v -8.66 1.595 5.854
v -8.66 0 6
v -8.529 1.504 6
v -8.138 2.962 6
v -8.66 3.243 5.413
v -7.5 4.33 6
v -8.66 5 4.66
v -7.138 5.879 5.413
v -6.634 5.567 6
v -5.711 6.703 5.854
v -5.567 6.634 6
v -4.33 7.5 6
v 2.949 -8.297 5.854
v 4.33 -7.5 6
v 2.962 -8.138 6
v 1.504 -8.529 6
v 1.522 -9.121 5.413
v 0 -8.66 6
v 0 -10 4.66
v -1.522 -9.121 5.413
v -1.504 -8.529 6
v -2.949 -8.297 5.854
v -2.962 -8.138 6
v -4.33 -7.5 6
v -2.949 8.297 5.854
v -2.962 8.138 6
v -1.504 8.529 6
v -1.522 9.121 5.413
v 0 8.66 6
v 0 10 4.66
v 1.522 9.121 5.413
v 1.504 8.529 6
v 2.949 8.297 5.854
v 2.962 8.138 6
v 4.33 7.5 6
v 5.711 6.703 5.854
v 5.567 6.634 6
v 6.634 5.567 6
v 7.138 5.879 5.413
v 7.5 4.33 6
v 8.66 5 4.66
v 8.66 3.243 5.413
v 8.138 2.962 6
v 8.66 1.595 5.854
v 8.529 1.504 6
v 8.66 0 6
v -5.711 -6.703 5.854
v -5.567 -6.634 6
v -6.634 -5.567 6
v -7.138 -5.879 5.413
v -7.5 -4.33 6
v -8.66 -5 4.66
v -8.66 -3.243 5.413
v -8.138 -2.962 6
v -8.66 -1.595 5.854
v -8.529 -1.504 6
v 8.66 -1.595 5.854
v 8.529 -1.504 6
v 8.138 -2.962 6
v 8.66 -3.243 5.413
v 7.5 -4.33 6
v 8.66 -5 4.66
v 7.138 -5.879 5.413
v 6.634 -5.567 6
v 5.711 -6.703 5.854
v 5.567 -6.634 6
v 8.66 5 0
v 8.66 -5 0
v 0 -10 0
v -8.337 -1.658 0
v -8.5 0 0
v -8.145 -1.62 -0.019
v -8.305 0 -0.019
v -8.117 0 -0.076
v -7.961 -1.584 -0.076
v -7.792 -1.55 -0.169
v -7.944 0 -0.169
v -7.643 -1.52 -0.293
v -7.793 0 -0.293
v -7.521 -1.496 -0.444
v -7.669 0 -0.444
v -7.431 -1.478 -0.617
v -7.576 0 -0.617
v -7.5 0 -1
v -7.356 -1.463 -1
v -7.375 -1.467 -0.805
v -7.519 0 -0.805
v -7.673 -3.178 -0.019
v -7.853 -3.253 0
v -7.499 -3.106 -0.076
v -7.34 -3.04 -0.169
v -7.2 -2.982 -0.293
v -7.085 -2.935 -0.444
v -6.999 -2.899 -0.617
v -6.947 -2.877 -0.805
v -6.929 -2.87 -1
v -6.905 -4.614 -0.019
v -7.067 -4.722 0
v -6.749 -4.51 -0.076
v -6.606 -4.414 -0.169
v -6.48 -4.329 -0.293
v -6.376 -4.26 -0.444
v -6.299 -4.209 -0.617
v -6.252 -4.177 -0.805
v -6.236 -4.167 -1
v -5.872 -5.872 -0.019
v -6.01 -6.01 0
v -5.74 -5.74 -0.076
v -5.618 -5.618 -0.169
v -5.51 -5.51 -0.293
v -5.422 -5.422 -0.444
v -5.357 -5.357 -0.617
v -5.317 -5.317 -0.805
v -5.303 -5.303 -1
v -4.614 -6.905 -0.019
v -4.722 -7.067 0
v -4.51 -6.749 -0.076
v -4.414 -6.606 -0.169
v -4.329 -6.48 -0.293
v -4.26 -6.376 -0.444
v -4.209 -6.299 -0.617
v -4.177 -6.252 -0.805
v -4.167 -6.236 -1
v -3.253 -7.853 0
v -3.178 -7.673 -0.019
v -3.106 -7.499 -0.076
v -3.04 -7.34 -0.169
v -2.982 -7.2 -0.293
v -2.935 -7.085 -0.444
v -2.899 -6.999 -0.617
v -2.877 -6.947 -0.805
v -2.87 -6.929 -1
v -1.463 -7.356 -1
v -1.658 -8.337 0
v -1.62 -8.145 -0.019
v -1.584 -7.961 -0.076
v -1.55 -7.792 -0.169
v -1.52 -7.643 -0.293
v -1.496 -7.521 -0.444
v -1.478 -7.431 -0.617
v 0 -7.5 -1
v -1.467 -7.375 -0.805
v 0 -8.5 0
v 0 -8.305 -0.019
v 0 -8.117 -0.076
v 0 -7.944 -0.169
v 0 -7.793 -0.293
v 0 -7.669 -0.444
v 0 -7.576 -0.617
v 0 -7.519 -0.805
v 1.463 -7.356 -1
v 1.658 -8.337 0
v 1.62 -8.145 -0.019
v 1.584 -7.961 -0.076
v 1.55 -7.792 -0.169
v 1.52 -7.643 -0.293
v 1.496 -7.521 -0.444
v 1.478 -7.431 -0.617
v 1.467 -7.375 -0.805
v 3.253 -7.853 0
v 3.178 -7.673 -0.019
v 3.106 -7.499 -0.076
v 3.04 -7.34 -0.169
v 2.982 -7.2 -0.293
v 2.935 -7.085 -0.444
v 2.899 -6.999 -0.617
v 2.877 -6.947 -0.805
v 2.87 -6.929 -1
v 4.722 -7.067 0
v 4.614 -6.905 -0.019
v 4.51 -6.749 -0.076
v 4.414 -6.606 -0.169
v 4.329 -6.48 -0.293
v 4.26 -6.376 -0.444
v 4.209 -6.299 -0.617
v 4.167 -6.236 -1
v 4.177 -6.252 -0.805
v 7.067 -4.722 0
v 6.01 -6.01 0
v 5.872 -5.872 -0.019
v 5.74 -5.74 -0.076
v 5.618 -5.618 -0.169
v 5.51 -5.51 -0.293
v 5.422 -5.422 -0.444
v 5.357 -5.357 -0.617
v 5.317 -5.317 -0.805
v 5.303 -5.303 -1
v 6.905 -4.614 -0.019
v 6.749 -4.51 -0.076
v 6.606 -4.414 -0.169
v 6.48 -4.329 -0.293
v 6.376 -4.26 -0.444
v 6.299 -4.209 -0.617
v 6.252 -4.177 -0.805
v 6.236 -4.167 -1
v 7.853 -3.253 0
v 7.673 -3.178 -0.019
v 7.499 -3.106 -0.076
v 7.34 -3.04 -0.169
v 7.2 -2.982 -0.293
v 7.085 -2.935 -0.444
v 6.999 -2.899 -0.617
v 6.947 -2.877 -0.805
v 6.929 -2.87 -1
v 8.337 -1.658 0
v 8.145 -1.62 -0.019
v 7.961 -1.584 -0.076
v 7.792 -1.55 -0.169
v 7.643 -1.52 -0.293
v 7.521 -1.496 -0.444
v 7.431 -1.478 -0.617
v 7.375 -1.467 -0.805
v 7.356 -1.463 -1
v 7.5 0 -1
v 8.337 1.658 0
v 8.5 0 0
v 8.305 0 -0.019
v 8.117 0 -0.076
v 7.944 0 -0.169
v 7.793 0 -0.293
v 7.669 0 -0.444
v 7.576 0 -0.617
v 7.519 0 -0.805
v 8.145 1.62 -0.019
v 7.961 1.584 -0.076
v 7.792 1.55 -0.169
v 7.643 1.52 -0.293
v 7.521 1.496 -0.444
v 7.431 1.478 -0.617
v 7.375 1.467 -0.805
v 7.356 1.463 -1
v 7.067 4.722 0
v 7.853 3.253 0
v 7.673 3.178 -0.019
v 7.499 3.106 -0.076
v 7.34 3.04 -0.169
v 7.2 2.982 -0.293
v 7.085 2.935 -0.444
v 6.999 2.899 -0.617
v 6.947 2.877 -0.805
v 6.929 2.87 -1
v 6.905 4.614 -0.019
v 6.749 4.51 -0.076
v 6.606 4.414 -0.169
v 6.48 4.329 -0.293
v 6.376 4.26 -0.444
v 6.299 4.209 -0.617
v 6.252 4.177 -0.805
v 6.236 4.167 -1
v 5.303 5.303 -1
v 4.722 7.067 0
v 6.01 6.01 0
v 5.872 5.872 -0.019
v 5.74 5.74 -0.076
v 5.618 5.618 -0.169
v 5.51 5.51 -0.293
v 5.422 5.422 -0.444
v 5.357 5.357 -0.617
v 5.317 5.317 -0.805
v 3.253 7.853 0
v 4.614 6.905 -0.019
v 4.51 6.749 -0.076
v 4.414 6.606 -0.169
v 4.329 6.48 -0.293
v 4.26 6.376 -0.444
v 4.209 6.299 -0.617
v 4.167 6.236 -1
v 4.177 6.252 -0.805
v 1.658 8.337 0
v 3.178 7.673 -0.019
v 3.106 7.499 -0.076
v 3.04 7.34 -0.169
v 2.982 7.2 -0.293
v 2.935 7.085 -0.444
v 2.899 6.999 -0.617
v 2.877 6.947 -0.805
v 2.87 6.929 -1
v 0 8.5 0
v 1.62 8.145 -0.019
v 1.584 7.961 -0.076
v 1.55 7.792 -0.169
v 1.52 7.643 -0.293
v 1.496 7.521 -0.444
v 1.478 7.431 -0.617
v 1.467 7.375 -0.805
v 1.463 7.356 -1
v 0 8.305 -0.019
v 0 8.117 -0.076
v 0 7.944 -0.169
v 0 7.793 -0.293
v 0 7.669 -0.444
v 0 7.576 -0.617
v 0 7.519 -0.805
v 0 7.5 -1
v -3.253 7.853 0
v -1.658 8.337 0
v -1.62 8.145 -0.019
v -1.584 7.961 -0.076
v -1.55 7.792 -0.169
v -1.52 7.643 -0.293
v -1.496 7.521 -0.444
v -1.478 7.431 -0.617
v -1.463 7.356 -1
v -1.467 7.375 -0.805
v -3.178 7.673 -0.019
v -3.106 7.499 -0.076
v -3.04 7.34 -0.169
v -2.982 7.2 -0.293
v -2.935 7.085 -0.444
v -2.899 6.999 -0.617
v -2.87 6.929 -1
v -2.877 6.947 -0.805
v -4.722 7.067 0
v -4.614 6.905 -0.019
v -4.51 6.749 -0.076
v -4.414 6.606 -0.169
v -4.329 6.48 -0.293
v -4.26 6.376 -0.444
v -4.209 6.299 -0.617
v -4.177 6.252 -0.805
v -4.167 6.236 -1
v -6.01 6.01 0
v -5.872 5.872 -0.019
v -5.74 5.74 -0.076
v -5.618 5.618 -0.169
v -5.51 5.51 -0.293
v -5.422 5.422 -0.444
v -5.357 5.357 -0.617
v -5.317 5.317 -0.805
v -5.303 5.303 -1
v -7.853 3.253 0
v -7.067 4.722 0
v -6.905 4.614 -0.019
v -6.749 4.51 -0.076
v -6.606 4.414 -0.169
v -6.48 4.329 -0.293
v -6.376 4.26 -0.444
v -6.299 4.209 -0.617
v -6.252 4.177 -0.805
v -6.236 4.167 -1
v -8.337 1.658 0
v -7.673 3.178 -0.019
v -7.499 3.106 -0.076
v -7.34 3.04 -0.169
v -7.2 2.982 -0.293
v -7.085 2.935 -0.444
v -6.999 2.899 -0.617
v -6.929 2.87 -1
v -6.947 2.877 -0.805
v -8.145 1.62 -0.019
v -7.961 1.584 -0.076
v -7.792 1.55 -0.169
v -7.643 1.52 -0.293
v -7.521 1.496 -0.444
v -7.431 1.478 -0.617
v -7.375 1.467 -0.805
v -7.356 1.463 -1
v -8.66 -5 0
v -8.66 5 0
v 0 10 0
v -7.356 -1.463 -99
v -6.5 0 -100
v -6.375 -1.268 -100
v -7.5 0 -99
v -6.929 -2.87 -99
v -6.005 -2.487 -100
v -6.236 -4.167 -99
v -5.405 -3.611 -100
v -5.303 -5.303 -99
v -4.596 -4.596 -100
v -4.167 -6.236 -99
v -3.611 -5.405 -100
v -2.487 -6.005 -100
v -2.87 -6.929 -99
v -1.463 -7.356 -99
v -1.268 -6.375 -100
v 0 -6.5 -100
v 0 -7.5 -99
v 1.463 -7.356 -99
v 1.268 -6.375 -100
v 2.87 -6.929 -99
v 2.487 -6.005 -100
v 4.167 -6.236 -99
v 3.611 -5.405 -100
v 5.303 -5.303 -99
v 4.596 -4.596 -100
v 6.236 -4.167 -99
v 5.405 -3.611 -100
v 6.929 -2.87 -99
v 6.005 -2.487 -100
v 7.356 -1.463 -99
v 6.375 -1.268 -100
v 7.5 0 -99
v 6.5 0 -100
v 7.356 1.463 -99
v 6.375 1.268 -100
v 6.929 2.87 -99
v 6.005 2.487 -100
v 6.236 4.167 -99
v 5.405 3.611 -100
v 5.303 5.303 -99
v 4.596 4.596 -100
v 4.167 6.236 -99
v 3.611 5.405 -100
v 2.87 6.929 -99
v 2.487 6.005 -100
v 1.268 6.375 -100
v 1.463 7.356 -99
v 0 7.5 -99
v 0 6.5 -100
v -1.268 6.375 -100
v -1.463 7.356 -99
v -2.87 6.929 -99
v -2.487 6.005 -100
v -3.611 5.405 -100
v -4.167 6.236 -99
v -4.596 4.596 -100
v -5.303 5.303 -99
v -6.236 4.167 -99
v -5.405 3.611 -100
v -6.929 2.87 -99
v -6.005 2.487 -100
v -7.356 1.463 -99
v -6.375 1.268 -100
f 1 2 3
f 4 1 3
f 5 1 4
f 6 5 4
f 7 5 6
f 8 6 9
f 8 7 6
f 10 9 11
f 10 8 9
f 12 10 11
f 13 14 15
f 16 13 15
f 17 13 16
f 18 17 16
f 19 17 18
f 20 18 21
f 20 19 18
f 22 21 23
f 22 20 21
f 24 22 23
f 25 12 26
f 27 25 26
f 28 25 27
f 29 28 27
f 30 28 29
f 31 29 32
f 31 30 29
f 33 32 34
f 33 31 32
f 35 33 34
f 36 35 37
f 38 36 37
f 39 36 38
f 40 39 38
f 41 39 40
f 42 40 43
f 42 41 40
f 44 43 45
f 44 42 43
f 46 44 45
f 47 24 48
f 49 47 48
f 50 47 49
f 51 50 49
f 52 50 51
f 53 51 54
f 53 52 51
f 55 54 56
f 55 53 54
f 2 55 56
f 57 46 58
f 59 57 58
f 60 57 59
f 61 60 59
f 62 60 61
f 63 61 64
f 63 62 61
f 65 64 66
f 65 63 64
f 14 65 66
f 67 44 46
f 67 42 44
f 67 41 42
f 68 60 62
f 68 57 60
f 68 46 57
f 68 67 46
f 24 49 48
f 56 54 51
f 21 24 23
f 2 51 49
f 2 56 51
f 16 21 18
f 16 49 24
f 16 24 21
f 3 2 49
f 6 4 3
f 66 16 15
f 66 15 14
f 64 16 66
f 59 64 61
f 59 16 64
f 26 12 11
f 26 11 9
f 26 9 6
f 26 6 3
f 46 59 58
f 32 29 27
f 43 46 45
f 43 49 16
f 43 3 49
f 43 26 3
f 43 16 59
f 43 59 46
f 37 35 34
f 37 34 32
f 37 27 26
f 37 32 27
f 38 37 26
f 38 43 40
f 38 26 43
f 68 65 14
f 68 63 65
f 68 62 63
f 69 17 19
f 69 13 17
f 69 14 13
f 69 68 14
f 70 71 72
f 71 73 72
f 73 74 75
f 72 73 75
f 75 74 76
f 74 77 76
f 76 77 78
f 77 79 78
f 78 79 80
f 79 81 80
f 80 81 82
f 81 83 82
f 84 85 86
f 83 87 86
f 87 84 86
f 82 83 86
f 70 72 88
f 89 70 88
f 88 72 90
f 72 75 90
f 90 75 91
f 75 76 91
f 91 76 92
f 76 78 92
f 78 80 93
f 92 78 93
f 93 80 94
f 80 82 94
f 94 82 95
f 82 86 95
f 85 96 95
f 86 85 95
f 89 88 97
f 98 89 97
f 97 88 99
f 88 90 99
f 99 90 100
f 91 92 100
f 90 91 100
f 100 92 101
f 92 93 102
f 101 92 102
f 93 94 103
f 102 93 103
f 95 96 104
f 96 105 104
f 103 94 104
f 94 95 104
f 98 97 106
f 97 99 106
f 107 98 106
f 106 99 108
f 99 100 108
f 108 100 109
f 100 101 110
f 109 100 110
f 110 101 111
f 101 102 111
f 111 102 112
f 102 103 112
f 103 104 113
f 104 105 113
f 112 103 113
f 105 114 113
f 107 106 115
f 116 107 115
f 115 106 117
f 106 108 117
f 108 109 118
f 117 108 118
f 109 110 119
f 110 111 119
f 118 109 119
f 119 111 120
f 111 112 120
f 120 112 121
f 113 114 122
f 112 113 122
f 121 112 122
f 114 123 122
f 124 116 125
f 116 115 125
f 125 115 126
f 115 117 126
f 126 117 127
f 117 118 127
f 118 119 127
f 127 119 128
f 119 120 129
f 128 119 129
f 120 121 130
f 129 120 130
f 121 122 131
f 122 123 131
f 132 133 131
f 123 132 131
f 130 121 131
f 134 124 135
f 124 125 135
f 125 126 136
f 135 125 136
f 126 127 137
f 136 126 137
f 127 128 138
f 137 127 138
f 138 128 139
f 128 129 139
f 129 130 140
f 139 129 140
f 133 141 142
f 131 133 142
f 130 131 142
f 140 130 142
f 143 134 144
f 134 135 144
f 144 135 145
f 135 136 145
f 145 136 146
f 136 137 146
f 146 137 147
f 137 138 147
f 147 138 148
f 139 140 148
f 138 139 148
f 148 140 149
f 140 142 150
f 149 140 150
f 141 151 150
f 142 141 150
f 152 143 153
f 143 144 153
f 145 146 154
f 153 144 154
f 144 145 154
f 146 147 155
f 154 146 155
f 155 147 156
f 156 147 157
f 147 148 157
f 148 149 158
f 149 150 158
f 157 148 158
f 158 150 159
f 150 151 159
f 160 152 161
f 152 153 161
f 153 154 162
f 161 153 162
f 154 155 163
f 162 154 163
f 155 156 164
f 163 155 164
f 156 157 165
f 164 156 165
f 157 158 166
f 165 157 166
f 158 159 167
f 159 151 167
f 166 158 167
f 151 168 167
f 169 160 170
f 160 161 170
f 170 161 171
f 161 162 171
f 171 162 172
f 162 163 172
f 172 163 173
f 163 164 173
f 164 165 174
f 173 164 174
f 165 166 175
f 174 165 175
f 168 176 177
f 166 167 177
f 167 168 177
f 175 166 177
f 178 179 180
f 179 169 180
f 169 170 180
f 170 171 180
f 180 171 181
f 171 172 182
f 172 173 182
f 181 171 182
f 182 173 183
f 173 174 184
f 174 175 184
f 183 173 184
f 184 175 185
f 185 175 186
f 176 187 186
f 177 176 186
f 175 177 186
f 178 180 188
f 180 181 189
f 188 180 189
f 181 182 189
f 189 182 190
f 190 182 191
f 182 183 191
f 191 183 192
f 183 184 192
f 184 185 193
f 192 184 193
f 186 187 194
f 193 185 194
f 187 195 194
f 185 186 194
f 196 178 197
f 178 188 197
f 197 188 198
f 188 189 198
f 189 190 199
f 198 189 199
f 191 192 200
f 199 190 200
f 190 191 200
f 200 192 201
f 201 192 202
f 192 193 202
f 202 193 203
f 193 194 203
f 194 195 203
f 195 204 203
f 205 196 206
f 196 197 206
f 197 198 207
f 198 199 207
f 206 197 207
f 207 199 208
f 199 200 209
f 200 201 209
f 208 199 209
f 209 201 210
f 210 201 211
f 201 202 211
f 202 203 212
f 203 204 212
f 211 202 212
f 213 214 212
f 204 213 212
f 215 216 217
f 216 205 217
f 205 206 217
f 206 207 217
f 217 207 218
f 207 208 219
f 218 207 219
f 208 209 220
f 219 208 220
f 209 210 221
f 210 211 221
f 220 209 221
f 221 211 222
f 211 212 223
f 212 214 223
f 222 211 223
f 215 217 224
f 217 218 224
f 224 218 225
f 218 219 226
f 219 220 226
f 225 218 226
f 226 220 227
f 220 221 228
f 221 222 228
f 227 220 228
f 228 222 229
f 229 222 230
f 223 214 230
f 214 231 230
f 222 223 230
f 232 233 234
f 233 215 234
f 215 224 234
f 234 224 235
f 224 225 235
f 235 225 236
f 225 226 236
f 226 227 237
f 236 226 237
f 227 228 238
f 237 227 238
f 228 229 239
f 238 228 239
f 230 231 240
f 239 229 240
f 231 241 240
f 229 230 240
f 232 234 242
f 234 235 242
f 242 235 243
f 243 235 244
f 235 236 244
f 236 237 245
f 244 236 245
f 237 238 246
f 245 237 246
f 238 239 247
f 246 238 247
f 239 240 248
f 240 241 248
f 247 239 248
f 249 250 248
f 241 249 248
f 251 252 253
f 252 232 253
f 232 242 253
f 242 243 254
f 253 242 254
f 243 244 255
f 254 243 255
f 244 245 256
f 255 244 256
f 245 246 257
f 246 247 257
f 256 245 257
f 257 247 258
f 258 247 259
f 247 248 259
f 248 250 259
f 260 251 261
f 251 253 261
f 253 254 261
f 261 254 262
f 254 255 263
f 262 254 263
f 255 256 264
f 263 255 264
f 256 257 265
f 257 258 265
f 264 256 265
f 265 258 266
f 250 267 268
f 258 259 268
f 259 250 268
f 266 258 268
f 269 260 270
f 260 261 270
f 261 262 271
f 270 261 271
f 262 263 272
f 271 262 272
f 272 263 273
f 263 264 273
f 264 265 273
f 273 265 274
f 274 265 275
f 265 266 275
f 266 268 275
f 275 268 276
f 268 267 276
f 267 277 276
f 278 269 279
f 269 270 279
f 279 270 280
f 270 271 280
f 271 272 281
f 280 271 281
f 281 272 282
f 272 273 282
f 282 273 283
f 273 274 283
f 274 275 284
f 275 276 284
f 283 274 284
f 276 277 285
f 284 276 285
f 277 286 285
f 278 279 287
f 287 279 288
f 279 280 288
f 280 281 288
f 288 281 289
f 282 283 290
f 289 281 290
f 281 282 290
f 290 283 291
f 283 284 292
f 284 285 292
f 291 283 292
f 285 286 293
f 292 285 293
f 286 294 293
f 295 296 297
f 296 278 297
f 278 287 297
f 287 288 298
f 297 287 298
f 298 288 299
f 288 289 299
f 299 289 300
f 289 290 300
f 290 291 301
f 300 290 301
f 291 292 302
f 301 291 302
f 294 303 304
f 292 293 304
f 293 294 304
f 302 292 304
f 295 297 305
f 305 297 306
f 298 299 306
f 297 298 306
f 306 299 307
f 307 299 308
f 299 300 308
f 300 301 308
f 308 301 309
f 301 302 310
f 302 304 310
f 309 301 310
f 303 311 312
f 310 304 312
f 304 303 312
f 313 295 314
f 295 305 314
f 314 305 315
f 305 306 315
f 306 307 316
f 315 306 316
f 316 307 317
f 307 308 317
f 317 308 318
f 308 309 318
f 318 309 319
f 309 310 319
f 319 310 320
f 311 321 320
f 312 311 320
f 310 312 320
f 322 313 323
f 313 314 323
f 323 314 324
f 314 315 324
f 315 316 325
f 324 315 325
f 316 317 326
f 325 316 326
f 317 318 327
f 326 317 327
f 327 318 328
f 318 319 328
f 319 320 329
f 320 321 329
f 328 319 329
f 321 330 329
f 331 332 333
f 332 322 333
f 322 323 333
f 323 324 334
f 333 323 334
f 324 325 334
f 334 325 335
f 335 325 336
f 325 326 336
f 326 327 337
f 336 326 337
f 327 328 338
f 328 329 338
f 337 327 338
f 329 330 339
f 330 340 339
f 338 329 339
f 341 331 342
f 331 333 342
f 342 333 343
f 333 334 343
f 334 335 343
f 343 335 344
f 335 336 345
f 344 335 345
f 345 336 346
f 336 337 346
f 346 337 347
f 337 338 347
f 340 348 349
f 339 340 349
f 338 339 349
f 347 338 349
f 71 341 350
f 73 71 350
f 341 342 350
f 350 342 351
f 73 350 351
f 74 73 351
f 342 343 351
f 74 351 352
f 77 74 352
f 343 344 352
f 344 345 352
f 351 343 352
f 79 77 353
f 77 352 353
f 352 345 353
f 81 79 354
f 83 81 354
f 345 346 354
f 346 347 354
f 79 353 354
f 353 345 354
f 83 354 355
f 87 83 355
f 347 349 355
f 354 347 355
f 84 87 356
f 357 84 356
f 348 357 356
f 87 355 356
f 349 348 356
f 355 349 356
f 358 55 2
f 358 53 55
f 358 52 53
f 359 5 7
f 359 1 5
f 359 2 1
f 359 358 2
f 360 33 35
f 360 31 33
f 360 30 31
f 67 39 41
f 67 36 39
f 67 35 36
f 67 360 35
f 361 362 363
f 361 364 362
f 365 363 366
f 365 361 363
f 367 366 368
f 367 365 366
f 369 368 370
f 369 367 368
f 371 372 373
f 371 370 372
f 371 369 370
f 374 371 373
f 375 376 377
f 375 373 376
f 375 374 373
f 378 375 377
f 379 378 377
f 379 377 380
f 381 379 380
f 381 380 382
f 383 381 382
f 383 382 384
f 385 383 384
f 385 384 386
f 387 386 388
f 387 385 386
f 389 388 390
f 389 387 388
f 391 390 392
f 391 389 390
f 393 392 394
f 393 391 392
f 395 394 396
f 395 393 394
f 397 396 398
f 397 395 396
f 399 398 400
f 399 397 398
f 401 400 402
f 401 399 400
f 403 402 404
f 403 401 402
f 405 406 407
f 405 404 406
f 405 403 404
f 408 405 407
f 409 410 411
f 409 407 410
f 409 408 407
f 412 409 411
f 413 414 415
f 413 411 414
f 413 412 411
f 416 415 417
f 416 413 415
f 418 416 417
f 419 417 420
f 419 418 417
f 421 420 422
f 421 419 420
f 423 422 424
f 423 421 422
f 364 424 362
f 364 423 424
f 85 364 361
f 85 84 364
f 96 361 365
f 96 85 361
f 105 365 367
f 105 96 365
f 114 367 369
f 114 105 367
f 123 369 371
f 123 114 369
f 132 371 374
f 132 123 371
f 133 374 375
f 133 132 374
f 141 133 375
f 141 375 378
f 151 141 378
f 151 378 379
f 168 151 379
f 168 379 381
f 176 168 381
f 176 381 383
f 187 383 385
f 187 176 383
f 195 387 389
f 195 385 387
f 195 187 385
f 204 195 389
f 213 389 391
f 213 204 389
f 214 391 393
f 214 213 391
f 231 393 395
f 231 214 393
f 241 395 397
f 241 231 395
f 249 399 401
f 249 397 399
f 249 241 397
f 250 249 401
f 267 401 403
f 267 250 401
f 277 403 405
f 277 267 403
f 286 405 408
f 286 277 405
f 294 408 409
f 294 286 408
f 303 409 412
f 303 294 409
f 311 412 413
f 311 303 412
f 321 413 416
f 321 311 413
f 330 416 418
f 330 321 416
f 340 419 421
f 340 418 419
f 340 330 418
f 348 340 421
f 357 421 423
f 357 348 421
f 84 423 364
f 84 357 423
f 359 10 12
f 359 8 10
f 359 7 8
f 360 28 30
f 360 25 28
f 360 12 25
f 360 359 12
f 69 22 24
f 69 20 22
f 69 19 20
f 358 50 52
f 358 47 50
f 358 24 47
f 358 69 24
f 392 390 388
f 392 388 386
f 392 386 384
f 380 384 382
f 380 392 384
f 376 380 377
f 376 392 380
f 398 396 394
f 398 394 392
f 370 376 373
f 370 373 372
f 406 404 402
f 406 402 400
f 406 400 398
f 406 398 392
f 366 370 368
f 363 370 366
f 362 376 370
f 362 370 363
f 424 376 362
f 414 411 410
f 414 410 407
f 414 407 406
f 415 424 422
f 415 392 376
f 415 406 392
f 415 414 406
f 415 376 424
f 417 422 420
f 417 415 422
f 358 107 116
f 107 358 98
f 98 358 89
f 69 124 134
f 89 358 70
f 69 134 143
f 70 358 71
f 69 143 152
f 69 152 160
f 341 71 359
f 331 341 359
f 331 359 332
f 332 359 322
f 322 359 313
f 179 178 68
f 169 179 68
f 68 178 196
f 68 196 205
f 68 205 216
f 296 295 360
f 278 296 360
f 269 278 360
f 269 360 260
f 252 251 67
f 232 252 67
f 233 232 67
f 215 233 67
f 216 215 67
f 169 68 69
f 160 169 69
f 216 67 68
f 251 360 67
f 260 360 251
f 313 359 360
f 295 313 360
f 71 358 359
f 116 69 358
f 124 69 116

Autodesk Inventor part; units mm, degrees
ref_plane "YZ Plane" through (0, 0, 0) normal (1, 0, 0) x (0, 1, 0)
ref_plane "XZ Plane" through (0, 0, 0) normal (0, 1, 0) x (-1, 0, 0)
ref_plane "XY Plane" through (0, 0, 0) normal (0, 0, 1) x (1, 0, 0)
sketch "Sketch1" plane through (0, 0, 0) normal (0, 0, 1) x (1, 0, 0)
  line L0 (8.6603, -5) -> (0, -10)
  line L1 (0, -10) -> (-8.6603, -5)
  line L2 (-8.6603, -5) -> (-8.6603, 5)
  line L3 (-8.6603, 5) -> (0, 10)
  line L4 (0, 10) -> (8.6603, 5)
  line L5 (8.6603, 5) -> (8.6603, -5)
  point P0 (0, 0)
  point P1 (0, 0)
  dimension "d0" = 10
extrude "Extrusion1" add sketch "Sketch1" along normal blind 6
sketch "Sketch2" plane through (0, 0, 6) normal (0, 0, 1) x (1, 0, 0)
  circle A0 centre (0, 0) radius 8.6603
  line L0 (0, -10) -> (8.6603, -5) projected
extrude "Extrusion2" cut sketch "Sketch2" against normal blind 6 draft 45 keep common part
sketch "Sketch3" plane through (0, 0, 0) normal (0, 0, -1) x (-1, 0, 0)
  circle A0 centre (0, 0) radius 7.5
  dimension "d5" = 15
extrude "Extrusion3" add sketch "Sketch3" along normal blind 100
fillet "Fillet1" radius 1 1 edges at (7.5, 0, 0)
chamfer "Chamfer1" distance 1 angle 45 1 edges at (7.5, 0, -100)
sketch "Sketch4" plane through (0, 0, 0) normal (0, 1, 0) x (-1, 0, 0)
  point P0 (0, 0)
sketch "Sketch5" plane through (0, 0, 0) normal (0, 1, 0) x (-1, 0, 0)
  point P0 (0, 0)
thread "Thread1" size "M15x1.5" class "6g" standard "ANSI Metric M Profile" length 77 offset 11
properties part number "Main Bolt"
